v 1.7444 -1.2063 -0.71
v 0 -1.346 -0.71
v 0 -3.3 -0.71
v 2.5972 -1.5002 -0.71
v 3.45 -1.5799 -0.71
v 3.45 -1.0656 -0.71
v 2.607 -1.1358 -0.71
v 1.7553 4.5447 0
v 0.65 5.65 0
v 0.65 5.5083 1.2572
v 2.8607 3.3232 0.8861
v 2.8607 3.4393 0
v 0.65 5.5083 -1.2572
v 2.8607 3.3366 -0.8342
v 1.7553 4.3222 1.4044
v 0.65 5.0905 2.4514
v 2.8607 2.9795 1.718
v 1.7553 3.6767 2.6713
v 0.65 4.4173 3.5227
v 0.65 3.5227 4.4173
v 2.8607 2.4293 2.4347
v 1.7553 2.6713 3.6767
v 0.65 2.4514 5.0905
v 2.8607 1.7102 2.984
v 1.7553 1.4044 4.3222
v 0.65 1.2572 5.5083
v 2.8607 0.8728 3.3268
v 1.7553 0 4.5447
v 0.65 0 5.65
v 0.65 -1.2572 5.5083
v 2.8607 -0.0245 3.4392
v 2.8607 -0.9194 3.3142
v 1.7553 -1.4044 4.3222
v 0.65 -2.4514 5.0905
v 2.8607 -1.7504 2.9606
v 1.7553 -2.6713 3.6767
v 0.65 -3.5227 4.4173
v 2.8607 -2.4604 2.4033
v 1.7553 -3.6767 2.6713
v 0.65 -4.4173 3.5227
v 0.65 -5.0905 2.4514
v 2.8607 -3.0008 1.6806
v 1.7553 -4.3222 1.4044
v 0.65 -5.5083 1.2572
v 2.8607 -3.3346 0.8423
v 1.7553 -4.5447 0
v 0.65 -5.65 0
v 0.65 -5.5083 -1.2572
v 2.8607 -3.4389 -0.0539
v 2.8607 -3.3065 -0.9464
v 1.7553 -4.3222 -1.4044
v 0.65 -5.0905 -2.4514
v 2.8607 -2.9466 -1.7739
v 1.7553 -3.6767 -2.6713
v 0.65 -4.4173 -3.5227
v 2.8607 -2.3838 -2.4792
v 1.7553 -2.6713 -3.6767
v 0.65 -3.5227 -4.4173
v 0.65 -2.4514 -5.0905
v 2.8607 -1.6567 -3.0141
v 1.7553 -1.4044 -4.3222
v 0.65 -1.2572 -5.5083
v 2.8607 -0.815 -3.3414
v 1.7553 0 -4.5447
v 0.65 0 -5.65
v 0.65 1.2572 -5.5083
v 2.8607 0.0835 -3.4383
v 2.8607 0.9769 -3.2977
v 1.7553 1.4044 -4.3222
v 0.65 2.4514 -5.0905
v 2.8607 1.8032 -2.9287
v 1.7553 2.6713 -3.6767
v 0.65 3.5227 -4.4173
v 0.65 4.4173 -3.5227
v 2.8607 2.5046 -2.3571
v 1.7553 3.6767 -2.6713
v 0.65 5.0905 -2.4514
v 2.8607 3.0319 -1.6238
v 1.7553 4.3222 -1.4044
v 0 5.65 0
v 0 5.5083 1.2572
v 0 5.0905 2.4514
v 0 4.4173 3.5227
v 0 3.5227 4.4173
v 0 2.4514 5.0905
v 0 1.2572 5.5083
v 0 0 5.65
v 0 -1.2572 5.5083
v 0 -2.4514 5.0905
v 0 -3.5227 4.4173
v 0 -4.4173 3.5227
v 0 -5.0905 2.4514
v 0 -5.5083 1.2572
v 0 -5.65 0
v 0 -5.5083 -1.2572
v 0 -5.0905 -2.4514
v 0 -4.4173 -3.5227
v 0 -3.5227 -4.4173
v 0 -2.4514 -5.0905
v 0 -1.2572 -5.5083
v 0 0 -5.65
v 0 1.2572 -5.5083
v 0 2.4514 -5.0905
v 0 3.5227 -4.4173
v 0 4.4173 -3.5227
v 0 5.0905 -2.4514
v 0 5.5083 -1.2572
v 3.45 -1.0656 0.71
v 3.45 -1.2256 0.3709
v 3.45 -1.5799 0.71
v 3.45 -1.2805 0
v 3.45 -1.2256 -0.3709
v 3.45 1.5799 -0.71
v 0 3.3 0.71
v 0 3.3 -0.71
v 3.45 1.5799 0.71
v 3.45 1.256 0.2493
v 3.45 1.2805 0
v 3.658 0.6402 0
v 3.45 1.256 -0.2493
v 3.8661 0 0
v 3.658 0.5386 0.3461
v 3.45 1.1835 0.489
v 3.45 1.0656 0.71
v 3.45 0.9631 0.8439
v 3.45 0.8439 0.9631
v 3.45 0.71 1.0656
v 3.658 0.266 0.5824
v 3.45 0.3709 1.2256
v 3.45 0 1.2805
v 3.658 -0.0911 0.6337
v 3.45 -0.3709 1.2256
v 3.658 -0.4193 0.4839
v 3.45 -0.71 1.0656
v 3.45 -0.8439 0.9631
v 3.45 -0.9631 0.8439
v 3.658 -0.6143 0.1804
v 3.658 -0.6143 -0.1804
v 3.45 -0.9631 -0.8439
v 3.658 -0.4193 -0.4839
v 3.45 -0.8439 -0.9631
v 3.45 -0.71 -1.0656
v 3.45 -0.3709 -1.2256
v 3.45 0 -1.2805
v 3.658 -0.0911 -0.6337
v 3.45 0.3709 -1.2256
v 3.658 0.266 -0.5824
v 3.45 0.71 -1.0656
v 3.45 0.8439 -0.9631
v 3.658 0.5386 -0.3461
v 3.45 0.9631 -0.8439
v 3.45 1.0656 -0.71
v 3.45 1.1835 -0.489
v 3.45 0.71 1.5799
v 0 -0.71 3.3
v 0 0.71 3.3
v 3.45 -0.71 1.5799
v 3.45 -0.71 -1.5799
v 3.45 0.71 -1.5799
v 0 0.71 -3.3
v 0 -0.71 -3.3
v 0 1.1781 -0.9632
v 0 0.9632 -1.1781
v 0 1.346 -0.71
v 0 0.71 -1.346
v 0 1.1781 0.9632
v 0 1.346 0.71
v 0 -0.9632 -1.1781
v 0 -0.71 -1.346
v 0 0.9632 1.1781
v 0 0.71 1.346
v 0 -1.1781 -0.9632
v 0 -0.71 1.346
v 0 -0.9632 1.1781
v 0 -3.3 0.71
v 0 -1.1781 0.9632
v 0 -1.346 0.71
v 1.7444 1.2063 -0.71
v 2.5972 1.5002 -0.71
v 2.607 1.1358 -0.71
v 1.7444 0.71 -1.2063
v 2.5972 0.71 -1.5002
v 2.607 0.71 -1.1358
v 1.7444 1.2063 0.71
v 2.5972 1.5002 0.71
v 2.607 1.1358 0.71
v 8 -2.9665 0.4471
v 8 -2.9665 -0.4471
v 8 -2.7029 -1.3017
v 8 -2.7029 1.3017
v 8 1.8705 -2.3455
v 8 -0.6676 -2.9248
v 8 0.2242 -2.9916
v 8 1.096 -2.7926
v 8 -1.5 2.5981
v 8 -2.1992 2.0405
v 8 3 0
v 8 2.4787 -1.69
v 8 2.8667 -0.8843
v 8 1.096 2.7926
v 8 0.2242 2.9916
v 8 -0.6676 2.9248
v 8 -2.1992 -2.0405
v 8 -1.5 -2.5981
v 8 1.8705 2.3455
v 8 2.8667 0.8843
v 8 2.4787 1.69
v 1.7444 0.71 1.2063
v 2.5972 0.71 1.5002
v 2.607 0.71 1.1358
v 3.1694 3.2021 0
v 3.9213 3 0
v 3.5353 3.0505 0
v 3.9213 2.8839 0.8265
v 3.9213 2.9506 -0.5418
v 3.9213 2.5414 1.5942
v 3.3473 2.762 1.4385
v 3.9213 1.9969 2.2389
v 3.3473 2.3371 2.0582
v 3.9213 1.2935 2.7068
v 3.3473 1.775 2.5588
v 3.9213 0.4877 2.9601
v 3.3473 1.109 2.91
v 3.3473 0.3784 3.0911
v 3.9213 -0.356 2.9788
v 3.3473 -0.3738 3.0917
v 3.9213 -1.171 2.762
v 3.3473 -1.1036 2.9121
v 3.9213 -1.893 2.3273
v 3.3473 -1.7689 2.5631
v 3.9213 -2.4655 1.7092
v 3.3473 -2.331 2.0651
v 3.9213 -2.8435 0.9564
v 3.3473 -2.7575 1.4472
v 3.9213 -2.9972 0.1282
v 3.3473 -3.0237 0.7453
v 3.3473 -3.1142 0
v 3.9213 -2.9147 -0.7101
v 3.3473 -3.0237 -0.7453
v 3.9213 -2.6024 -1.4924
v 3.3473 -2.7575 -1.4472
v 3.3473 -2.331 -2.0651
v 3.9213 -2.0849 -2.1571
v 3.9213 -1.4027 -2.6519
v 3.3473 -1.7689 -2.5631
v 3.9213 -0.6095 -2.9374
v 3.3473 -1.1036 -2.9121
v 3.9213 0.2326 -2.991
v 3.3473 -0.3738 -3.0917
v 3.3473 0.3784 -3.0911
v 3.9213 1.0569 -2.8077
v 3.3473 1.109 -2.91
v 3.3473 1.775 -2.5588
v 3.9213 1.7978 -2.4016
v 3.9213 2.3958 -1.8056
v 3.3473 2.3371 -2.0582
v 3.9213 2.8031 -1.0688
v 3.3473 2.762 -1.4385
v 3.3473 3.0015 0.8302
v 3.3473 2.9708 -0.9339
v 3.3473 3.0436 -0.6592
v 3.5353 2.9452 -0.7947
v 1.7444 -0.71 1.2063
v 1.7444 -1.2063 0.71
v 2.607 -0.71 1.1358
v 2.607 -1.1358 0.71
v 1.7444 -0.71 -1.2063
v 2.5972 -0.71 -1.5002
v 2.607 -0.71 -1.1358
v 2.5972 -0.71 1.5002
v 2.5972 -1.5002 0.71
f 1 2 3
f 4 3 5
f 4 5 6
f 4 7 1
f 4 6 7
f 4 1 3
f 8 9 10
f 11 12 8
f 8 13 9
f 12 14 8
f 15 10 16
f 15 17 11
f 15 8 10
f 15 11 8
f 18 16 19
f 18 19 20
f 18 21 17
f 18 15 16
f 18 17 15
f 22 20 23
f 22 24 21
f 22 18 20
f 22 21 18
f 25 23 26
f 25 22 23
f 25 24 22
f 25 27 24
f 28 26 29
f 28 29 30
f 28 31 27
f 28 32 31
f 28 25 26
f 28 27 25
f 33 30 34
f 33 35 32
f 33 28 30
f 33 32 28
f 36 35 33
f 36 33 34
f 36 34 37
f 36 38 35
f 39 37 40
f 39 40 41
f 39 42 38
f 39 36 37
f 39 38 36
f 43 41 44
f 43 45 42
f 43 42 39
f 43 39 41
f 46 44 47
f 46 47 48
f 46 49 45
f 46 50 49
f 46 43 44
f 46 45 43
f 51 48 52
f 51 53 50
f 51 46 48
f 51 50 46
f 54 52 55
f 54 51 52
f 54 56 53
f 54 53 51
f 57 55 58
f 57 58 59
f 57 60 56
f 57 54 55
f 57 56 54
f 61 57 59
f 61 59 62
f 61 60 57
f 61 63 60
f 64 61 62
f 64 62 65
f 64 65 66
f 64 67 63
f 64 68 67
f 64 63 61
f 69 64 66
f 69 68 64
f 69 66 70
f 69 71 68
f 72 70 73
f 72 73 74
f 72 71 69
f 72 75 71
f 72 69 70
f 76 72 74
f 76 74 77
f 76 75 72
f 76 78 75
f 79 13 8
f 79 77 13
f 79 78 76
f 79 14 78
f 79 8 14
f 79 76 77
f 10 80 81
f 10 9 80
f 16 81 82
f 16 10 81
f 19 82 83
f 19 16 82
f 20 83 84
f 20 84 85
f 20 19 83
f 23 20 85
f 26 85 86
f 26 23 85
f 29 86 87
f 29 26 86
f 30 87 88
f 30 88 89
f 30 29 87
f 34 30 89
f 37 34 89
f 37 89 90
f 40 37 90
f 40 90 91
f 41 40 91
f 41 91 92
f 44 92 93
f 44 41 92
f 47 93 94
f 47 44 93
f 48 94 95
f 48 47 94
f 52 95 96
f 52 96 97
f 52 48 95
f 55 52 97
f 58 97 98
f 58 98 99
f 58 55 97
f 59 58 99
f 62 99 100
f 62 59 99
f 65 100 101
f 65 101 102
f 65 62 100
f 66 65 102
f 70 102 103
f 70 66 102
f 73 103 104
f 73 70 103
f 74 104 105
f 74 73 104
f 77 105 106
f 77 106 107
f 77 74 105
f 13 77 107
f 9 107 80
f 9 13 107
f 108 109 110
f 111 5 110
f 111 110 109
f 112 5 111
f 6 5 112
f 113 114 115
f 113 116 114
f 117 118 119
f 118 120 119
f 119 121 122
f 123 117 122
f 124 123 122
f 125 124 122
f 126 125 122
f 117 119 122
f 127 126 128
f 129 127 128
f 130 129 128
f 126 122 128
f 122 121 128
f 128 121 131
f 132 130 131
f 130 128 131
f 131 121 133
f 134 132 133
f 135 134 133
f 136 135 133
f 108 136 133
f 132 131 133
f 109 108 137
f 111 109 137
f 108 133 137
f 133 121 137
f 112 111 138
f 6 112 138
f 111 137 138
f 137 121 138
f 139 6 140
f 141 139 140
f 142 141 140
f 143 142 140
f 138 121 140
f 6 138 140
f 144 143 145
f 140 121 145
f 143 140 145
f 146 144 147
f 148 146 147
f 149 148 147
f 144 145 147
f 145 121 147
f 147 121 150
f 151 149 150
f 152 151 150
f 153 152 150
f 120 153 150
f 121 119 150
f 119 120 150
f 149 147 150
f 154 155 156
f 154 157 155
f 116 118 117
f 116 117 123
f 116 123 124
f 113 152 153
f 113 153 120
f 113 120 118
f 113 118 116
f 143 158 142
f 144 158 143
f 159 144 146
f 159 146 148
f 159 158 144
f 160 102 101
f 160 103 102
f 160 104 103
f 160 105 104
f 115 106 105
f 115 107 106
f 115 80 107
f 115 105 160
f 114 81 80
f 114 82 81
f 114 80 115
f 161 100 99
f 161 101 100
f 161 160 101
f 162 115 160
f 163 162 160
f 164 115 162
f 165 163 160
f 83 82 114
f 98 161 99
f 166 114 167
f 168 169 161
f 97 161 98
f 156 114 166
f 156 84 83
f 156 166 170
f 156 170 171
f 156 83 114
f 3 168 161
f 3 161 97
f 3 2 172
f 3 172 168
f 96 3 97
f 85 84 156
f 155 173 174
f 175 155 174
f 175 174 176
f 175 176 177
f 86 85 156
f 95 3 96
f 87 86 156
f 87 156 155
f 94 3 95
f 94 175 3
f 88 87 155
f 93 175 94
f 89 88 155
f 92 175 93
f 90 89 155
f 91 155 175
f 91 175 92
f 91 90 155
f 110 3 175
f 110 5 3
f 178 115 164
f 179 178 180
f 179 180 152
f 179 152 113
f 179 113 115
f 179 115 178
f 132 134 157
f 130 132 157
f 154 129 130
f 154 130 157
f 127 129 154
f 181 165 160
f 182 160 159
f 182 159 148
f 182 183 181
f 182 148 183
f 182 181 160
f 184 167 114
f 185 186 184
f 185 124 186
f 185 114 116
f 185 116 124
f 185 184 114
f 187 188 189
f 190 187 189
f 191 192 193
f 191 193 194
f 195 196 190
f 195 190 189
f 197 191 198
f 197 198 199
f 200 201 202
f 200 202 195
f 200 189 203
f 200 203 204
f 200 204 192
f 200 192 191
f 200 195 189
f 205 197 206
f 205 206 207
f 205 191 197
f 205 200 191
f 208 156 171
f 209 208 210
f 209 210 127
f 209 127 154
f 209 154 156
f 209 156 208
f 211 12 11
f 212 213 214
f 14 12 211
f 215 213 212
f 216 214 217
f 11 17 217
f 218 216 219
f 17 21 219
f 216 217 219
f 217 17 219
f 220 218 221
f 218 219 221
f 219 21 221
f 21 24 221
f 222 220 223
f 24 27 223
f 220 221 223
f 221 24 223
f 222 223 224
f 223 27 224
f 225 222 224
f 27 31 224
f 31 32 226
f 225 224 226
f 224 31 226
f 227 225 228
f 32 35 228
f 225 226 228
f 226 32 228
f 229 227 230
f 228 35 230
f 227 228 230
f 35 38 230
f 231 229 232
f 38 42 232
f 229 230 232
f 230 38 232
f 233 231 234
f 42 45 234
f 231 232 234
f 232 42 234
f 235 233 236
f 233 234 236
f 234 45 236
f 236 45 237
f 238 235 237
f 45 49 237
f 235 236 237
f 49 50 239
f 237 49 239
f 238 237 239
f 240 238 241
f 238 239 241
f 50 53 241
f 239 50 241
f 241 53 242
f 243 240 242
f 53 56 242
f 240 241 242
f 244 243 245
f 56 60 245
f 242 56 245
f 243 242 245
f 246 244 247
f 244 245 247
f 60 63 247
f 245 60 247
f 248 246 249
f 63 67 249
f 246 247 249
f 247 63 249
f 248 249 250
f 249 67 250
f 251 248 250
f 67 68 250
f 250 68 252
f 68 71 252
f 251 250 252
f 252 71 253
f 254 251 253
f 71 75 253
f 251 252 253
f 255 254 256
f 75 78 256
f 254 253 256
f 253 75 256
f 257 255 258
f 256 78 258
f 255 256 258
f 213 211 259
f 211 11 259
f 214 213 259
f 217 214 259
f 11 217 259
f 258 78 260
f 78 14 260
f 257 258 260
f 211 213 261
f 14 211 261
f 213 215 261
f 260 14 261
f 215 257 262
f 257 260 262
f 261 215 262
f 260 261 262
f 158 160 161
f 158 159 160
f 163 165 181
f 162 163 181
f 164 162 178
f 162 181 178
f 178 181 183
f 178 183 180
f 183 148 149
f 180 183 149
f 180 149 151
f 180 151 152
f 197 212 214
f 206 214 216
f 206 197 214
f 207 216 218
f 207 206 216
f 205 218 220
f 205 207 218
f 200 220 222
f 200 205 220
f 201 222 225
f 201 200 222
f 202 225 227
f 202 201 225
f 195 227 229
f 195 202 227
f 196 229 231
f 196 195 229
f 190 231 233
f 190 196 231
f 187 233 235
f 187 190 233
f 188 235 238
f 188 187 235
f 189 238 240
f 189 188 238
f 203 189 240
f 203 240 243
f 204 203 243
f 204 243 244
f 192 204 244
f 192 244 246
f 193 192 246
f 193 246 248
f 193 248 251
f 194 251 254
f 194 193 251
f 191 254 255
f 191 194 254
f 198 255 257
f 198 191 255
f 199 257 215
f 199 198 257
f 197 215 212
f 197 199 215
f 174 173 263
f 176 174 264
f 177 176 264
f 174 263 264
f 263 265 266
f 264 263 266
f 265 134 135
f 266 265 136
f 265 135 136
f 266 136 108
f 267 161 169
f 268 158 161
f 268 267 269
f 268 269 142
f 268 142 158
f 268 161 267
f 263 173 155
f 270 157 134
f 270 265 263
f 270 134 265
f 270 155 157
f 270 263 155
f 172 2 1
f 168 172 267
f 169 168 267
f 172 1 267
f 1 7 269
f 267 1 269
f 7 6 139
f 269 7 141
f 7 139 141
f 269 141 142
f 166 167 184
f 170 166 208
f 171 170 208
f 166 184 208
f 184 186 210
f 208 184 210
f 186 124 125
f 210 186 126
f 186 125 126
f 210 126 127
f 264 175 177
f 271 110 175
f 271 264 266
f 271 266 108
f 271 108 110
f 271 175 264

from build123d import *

# Parameters (mm, degrees)
FILLET1_R    = 1.5
SKETCH3_W    = 1.42
SKETCH3_H    = 6.6
SKETCH4_W    = 1.42
SKETCH4_H    = 3.15978748
RECPAT_COUNT = 2
RECPAT_ANGLE = 90


with BuildPart() as part:
    # BodySke → Base-Revolve (revolve)
    with BuildSketch(Plane.XY):
        Polygon((0, 0), (0, 5.65), (0.65, 5.65), (3.3, 3), (8, 3), (8, 0), align=None)
    revolve(axis=Axis((-6.35, 0, 0), (1, 0, 0)))

    # Fillet1
    fillet1_edges = [part.edges().sort_by_distance(p)[0] for p in [
        (3.3, -3, 0),
    ]]
    fillet(fillet1_edges, radius=FILLET1_R)

    # Sketch3 → Recess section 0
    with BuildSketch(Plane.ZY):
        Rectangle(SKETCH3_W, SKETCH3_H)
    # Sketch4 → Recess section 1
    with BuildSketch(Plane.ZY.offset(-3.45)):
        Rectangle(SKETCH4_W, SKETCH4_H)
    recess = loft(mode=Mode.SUBTRACT)

    # RecPat: Recess ×2 about axis
    recpat_axis = Axis((0, 0, 0), (1, 0, 0))
    for i in range(1, RECPAT_COUNT):
        add(recess.rotate(recpat_axis, i * RECPAT_ANGLE / (RECPAT_COUNT - 1)), mode=Mode.SUBTRACT)

    # RecCorSke → RecessCore (revolve, cut)
    with BuildSketch(Plane.XY):
        Polygon((0, 0), (0, 1.521747501), (3.45, 1.2805), (3.866059671, 0), align=None)
    revolve(axis=Axis((-3.175, 0, 0), (1, 0, 0)), mode=Mode.SUBTRACT)


solid = part.part
